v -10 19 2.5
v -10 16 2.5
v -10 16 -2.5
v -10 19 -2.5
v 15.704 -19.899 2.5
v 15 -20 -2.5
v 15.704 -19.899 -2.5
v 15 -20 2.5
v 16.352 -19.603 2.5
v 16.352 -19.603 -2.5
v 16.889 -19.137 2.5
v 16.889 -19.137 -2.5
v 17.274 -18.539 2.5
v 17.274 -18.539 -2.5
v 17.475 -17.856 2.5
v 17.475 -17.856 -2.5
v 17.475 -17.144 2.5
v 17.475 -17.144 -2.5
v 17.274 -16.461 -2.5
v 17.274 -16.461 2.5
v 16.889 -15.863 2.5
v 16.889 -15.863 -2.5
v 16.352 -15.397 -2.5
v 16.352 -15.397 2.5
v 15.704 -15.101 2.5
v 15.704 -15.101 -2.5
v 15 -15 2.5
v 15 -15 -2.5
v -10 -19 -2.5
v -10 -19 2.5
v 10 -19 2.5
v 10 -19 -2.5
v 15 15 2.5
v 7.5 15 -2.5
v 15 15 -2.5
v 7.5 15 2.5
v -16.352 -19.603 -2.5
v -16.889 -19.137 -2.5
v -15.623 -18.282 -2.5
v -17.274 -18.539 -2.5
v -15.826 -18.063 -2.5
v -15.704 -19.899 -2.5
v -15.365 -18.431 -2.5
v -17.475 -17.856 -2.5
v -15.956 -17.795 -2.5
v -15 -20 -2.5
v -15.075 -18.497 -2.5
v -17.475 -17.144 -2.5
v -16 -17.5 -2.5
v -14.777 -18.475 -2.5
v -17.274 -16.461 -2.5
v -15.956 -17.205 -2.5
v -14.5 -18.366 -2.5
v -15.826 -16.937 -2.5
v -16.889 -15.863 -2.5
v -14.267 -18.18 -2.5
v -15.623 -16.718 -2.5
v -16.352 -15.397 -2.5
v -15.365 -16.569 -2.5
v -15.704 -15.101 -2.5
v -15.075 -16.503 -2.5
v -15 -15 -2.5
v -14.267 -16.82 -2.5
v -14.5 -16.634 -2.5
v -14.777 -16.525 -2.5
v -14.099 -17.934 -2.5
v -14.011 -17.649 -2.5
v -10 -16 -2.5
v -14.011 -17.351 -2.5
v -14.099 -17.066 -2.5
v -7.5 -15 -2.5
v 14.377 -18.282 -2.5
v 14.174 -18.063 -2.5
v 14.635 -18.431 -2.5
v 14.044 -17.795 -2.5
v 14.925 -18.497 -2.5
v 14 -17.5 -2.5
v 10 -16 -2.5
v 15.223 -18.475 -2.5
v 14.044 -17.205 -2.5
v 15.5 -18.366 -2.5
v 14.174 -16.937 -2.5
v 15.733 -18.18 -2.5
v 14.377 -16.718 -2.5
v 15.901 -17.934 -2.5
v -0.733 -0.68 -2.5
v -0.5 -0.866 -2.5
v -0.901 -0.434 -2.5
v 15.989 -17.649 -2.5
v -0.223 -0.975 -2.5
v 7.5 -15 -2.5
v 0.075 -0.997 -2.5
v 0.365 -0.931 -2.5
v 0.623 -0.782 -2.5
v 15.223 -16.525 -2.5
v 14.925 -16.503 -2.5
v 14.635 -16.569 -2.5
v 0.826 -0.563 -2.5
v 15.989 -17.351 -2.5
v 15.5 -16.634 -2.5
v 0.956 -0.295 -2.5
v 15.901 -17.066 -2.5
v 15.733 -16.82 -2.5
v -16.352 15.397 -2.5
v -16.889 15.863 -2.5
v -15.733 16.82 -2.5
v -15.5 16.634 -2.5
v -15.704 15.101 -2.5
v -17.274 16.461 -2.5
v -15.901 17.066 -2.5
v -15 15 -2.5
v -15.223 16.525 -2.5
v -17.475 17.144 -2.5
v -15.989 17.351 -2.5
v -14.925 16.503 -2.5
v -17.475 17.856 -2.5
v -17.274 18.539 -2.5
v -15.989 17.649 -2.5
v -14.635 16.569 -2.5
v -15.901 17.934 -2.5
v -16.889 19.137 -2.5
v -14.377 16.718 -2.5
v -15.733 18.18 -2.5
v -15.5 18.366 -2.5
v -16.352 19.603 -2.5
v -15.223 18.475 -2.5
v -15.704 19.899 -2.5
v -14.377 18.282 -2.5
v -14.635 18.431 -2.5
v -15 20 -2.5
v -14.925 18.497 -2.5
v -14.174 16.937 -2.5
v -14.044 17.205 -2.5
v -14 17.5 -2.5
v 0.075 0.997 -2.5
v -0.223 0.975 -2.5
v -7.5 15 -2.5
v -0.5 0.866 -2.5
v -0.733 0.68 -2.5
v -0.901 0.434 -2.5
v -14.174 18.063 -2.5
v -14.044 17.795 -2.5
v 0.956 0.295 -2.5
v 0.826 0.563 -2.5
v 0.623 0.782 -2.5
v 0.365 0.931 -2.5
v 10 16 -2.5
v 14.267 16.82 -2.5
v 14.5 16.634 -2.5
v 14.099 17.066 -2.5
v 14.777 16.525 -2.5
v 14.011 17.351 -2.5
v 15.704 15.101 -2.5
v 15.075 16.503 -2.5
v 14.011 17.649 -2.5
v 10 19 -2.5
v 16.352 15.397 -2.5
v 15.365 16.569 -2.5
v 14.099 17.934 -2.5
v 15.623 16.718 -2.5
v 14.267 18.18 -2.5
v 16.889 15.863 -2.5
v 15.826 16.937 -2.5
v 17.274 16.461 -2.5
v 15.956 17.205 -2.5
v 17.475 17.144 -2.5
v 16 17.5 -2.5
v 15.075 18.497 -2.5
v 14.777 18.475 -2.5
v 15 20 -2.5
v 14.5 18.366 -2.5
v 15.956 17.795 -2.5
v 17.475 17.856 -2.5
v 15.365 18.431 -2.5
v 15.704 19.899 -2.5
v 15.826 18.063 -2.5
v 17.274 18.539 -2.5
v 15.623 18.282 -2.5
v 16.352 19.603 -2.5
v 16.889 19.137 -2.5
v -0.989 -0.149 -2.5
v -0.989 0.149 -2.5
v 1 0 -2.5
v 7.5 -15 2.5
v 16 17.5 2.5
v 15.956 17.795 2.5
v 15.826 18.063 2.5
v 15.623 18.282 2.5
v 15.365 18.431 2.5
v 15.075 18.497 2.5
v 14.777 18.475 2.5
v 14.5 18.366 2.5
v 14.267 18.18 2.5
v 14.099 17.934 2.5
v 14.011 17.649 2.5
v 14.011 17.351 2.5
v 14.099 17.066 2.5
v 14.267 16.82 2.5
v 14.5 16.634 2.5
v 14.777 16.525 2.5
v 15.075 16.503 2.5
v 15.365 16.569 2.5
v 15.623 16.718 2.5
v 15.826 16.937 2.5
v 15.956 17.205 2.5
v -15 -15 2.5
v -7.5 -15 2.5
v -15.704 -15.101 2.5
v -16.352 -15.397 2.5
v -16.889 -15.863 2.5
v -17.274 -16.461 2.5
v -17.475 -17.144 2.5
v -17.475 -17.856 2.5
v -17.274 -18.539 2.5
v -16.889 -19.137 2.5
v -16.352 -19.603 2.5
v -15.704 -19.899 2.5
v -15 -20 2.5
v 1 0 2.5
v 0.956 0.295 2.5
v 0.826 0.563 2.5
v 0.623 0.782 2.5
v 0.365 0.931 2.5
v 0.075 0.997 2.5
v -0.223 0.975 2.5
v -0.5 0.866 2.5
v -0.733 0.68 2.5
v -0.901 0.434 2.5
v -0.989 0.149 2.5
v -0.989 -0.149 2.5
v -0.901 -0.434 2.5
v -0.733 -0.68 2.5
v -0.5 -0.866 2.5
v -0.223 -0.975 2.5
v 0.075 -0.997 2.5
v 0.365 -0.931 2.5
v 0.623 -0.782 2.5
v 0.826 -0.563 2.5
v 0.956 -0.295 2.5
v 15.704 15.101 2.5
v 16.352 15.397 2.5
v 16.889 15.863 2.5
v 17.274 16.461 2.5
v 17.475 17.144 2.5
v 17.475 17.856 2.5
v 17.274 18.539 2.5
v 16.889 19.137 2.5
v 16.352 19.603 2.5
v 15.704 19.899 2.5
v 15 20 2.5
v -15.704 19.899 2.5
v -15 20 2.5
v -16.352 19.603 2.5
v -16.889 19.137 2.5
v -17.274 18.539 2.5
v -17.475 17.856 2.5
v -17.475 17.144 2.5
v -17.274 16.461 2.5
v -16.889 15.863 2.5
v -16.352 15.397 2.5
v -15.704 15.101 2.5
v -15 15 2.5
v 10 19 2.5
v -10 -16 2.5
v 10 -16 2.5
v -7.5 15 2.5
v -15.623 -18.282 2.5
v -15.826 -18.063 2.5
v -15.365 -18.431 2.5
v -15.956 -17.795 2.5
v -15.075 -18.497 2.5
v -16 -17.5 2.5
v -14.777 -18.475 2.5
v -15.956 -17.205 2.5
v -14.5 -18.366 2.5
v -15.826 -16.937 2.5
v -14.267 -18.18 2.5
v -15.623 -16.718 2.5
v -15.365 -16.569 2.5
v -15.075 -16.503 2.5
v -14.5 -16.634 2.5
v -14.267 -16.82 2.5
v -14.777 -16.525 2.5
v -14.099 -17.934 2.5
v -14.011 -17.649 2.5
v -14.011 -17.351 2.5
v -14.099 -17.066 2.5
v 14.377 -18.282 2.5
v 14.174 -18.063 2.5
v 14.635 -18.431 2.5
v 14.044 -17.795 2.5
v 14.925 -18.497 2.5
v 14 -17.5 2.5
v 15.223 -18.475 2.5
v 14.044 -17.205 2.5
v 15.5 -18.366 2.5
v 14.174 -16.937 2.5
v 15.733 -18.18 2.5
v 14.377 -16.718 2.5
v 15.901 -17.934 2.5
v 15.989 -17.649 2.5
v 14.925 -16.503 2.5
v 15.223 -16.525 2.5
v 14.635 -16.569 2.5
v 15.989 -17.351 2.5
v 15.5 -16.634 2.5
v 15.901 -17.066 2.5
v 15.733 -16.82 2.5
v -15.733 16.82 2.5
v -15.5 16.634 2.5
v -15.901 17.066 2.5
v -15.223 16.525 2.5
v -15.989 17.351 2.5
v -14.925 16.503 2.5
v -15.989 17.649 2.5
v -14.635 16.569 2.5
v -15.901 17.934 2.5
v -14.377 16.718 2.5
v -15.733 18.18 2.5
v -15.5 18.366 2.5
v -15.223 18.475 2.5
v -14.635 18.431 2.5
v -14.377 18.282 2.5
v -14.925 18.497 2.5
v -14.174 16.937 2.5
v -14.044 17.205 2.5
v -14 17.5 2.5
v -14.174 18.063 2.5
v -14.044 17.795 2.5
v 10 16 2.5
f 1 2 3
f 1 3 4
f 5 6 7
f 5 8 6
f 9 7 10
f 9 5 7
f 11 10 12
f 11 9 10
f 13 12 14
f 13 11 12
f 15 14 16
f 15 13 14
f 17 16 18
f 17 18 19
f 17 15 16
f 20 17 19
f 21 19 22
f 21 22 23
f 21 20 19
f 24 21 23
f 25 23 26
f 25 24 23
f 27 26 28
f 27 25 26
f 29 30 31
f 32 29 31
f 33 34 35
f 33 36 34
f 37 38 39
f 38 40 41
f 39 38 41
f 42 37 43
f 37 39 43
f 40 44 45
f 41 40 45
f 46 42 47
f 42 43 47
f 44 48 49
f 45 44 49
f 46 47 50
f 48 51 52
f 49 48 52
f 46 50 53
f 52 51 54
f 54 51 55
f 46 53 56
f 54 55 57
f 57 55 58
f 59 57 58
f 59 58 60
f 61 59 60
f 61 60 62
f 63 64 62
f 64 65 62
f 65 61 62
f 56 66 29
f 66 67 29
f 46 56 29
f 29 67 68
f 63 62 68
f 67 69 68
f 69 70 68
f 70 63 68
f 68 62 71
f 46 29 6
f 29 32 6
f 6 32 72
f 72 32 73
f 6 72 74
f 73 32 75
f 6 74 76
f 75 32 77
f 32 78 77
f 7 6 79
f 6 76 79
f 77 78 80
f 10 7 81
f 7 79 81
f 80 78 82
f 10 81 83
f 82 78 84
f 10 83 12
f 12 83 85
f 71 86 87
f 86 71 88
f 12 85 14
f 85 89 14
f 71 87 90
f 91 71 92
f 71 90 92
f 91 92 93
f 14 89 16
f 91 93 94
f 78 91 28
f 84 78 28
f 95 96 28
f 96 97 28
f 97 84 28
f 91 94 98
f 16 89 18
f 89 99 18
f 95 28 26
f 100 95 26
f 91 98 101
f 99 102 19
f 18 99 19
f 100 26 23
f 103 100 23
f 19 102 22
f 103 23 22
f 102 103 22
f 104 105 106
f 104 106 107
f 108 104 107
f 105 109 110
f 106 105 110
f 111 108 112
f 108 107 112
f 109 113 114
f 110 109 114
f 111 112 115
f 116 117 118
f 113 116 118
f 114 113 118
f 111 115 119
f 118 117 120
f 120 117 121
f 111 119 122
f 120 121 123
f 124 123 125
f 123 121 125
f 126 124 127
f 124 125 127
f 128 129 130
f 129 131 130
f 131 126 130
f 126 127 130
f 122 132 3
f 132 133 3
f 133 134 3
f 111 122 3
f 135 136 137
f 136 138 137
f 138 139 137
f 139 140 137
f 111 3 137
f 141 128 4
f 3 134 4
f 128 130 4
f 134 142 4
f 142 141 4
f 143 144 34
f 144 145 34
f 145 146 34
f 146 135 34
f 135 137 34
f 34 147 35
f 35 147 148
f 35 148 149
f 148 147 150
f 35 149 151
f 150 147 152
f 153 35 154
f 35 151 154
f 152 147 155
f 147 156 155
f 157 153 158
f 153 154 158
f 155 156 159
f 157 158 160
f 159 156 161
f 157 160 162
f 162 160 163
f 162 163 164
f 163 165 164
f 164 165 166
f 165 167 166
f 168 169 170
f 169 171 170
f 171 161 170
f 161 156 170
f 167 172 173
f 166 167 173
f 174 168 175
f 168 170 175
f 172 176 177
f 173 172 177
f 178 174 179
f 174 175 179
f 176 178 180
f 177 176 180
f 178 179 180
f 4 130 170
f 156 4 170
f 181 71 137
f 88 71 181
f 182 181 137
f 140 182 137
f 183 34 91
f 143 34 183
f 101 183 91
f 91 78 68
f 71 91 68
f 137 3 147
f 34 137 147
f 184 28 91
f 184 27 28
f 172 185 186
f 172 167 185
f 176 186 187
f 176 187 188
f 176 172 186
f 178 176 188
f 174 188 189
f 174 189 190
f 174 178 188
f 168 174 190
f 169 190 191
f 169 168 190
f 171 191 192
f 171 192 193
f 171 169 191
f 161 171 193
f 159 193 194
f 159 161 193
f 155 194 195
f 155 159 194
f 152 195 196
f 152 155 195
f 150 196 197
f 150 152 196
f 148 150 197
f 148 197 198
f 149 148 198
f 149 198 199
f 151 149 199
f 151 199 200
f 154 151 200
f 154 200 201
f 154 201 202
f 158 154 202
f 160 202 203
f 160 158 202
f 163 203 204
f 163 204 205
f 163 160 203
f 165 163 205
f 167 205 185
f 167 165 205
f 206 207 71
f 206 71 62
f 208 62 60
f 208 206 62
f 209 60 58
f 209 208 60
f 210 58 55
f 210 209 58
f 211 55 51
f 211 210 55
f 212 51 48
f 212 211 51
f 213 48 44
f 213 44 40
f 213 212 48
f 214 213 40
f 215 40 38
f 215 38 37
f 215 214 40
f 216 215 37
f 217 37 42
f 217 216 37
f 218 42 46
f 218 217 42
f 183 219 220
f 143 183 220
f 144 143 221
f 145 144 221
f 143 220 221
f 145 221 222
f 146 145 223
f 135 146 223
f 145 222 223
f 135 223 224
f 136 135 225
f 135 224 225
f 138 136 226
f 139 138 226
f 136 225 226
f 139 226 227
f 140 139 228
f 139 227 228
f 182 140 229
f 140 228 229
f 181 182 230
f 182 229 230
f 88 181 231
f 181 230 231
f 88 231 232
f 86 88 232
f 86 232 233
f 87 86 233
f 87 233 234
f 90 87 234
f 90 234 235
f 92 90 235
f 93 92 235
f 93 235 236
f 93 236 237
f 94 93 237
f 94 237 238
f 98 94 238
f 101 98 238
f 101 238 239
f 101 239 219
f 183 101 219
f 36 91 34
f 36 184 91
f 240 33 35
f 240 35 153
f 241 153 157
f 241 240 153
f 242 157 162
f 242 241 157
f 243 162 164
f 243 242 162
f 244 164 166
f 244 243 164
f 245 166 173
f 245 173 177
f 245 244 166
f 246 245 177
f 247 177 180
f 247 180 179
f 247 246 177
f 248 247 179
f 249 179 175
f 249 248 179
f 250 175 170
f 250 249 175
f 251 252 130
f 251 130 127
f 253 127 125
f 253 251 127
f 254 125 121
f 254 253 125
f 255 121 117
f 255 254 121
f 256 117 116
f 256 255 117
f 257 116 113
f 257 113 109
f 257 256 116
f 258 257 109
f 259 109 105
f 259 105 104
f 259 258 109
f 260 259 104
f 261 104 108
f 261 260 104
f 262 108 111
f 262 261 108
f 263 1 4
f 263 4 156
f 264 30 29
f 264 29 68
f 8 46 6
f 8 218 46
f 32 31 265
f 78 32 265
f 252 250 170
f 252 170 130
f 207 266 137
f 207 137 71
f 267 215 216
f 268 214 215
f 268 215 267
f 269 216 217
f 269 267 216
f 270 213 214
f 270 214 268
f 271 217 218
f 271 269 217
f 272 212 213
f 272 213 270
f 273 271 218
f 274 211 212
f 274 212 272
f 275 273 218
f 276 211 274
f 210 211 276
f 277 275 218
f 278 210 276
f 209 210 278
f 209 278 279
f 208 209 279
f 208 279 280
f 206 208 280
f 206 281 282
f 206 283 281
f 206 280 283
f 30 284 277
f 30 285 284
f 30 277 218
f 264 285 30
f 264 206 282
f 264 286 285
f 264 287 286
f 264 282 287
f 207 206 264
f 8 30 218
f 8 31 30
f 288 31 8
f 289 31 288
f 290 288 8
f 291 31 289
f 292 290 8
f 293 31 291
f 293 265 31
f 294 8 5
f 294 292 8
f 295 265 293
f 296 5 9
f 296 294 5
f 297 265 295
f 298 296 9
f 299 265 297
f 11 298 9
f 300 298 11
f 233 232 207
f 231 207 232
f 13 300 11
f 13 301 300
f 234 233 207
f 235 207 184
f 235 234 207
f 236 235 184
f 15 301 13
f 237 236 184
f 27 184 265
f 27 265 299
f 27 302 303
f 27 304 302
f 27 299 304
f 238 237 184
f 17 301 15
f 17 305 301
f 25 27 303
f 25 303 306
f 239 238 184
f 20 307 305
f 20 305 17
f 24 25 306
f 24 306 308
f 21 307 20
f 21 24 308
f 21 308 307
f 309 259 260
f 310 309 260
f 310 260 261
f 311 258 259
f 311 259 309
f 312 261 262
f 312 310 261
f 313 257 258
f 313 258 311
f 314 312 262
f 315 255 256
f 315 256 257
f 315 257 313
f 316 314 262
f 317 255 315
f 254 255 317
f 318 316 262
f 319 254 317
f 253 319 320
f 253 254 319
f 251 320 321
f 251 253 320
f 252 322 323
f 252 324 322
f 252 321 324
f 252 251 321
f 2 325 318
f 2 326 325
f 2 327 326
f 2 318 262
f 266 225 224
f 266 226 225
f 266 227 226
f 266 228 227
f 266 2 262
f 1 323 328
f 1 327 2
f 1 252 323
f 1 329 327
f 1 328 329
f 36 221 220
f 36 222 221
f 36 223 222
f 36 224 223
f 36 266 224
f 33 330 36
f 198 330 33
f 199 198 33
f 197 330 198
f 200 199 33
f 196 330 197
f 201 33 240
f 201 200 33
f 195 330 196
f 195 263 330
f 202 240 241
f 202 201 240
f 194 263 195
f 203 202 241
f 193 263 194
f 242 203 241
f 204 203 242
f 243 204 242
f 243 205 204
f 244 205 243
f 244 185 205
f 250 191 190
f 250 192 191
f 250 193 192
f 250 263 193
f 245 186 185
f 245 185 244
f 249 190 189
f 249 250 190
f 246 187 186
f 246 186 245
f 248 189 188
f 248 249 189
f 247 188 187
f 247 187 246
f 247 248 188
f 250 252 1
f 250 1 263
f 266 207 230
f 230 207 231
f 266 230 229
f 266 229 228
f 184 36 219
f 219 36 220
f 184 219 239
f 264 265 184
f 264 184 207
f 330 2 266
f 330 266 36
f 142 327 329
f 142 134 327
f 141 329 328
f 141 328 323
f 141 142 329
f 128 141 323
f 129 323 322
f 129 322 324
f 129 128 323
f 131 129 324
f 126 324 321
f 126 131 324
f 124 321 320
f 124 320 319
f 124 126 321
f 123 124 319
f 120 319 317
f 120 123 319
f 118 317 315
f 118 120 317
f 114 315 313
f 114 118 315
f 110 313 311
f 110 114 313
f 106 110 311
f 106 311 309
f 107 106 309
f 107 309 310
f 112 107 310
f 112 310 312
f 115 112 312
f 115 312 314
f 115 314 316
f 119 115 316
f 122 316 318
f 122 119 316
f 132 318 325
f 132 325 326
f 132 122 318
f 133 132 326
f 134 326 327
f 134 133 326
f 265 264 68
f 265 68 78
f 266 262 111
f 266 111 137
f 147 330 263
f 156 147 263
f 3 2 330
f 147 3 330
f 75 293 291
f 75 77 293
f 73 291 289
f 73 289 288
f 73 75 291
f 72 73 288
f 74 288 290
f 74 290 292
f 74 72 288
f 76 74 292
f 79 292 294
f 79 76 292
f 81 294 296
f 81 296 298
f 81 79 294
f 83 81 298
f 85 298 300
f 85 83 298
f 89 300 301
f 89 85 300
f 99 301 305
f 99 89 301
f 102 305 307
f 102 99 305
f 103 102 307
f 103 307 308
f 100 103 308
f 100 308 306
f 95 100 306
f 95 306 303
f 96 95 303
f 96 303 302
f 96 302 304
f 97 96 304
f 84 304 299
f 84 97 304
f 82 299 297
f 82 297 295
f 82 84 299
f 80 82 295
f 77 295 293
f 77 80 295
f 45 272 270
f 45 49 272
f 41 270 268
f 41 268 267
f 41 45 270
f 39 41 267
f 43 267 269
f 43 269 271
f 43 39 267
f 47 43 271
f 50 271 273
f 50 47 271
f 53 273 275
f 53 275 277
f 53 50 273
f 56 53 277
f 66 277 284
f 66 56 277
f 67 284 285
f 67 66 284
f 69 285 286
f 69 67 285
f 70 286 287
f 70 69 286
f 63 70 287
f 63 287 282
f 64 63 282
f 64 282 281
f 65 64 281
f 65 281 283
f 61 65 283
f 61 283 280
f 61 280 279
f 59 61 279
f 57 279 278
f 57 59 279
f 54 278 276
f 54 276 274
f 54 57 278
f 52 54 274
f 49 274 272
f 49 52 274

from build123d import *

# Parameters (mm, degrees)
SKETCH1_R           = 1
BOSS_EXTRUDE2_DEPTH = 2.5
SKETCH2_R           = 1
SKETCH2_W           = 20
SKETCH2_H           = 3
CUT_EXTRUDE1_DEPTH  = 28.041634566


with BuildPart() as part:
    # Sketch1 → Boss-Extrude2 (new, symmetric)
    with BuildSketch(Plane.XY):
        with BuildLine():
            Line((7.5, 15), (15, 15))
            ThreePointArc((15, 15), (17.5, 17.5), (15, 20))
            Line((15, 20), (-15, 20))
            ThreePointArc((-15, 20), (-17.5, 17.5), (-15, 15))
            Line((-15, 15), (-7.5, 15))
            Line((-7.5, 15), (-7.5, -15))
            Line((-7.5, -15), (-15, -15))
            ThreePointArc((-15, -15), (-17.5, -17.5), (-15, -20))
            Line((-15, -20), (15, -20))
            ThreePointArc((15, -20), (17.5, -17.5), (15, -15))
            Line((15, -15), (7.5, -15))
            Line((7.5, -15), (7.5, 15))
        make_face()
        with Locations((-15, 17.5)):
            Circle(SKETCH1_R, mode=Mode.SUBTRACT)
        with Locations((15, 17.5)):
            Circle(SKETCH1_R, mode=Mode.SUBTRACT)
        with Locations(Location((15, -17.5, 0), (0, 0, 180))):
            Circle(SKETCH1_R, mode=Mode.SUBTRACT)
        with Locations(Location((-15, -17.5, 0), (0, 0, 180))):
            Circle(SKETCH1_R, mode=Mode.SUBTRACT)
    extrude(amount=BOSS_EXTRUDE2_DEPTH, both=True)

    # Sketch2 → Cut-Extrude1 (cut, through all)
    with BuildSketch(Plane.XY.offset(2.5)):
        Circle(SKETCH2_R)
        with Locations((0, 17.5)):
            Rectangle(SKETCH2_W, SKETCH2_H)
        with Locations((0, -17.5)):
            Rectangle(SKETCH2_W, SKETCH2_H)
    extrude(amount=-CUT_EXTRUDE1_DEPTH, mode=Mode.SUBTRACT)


solid = part.part
